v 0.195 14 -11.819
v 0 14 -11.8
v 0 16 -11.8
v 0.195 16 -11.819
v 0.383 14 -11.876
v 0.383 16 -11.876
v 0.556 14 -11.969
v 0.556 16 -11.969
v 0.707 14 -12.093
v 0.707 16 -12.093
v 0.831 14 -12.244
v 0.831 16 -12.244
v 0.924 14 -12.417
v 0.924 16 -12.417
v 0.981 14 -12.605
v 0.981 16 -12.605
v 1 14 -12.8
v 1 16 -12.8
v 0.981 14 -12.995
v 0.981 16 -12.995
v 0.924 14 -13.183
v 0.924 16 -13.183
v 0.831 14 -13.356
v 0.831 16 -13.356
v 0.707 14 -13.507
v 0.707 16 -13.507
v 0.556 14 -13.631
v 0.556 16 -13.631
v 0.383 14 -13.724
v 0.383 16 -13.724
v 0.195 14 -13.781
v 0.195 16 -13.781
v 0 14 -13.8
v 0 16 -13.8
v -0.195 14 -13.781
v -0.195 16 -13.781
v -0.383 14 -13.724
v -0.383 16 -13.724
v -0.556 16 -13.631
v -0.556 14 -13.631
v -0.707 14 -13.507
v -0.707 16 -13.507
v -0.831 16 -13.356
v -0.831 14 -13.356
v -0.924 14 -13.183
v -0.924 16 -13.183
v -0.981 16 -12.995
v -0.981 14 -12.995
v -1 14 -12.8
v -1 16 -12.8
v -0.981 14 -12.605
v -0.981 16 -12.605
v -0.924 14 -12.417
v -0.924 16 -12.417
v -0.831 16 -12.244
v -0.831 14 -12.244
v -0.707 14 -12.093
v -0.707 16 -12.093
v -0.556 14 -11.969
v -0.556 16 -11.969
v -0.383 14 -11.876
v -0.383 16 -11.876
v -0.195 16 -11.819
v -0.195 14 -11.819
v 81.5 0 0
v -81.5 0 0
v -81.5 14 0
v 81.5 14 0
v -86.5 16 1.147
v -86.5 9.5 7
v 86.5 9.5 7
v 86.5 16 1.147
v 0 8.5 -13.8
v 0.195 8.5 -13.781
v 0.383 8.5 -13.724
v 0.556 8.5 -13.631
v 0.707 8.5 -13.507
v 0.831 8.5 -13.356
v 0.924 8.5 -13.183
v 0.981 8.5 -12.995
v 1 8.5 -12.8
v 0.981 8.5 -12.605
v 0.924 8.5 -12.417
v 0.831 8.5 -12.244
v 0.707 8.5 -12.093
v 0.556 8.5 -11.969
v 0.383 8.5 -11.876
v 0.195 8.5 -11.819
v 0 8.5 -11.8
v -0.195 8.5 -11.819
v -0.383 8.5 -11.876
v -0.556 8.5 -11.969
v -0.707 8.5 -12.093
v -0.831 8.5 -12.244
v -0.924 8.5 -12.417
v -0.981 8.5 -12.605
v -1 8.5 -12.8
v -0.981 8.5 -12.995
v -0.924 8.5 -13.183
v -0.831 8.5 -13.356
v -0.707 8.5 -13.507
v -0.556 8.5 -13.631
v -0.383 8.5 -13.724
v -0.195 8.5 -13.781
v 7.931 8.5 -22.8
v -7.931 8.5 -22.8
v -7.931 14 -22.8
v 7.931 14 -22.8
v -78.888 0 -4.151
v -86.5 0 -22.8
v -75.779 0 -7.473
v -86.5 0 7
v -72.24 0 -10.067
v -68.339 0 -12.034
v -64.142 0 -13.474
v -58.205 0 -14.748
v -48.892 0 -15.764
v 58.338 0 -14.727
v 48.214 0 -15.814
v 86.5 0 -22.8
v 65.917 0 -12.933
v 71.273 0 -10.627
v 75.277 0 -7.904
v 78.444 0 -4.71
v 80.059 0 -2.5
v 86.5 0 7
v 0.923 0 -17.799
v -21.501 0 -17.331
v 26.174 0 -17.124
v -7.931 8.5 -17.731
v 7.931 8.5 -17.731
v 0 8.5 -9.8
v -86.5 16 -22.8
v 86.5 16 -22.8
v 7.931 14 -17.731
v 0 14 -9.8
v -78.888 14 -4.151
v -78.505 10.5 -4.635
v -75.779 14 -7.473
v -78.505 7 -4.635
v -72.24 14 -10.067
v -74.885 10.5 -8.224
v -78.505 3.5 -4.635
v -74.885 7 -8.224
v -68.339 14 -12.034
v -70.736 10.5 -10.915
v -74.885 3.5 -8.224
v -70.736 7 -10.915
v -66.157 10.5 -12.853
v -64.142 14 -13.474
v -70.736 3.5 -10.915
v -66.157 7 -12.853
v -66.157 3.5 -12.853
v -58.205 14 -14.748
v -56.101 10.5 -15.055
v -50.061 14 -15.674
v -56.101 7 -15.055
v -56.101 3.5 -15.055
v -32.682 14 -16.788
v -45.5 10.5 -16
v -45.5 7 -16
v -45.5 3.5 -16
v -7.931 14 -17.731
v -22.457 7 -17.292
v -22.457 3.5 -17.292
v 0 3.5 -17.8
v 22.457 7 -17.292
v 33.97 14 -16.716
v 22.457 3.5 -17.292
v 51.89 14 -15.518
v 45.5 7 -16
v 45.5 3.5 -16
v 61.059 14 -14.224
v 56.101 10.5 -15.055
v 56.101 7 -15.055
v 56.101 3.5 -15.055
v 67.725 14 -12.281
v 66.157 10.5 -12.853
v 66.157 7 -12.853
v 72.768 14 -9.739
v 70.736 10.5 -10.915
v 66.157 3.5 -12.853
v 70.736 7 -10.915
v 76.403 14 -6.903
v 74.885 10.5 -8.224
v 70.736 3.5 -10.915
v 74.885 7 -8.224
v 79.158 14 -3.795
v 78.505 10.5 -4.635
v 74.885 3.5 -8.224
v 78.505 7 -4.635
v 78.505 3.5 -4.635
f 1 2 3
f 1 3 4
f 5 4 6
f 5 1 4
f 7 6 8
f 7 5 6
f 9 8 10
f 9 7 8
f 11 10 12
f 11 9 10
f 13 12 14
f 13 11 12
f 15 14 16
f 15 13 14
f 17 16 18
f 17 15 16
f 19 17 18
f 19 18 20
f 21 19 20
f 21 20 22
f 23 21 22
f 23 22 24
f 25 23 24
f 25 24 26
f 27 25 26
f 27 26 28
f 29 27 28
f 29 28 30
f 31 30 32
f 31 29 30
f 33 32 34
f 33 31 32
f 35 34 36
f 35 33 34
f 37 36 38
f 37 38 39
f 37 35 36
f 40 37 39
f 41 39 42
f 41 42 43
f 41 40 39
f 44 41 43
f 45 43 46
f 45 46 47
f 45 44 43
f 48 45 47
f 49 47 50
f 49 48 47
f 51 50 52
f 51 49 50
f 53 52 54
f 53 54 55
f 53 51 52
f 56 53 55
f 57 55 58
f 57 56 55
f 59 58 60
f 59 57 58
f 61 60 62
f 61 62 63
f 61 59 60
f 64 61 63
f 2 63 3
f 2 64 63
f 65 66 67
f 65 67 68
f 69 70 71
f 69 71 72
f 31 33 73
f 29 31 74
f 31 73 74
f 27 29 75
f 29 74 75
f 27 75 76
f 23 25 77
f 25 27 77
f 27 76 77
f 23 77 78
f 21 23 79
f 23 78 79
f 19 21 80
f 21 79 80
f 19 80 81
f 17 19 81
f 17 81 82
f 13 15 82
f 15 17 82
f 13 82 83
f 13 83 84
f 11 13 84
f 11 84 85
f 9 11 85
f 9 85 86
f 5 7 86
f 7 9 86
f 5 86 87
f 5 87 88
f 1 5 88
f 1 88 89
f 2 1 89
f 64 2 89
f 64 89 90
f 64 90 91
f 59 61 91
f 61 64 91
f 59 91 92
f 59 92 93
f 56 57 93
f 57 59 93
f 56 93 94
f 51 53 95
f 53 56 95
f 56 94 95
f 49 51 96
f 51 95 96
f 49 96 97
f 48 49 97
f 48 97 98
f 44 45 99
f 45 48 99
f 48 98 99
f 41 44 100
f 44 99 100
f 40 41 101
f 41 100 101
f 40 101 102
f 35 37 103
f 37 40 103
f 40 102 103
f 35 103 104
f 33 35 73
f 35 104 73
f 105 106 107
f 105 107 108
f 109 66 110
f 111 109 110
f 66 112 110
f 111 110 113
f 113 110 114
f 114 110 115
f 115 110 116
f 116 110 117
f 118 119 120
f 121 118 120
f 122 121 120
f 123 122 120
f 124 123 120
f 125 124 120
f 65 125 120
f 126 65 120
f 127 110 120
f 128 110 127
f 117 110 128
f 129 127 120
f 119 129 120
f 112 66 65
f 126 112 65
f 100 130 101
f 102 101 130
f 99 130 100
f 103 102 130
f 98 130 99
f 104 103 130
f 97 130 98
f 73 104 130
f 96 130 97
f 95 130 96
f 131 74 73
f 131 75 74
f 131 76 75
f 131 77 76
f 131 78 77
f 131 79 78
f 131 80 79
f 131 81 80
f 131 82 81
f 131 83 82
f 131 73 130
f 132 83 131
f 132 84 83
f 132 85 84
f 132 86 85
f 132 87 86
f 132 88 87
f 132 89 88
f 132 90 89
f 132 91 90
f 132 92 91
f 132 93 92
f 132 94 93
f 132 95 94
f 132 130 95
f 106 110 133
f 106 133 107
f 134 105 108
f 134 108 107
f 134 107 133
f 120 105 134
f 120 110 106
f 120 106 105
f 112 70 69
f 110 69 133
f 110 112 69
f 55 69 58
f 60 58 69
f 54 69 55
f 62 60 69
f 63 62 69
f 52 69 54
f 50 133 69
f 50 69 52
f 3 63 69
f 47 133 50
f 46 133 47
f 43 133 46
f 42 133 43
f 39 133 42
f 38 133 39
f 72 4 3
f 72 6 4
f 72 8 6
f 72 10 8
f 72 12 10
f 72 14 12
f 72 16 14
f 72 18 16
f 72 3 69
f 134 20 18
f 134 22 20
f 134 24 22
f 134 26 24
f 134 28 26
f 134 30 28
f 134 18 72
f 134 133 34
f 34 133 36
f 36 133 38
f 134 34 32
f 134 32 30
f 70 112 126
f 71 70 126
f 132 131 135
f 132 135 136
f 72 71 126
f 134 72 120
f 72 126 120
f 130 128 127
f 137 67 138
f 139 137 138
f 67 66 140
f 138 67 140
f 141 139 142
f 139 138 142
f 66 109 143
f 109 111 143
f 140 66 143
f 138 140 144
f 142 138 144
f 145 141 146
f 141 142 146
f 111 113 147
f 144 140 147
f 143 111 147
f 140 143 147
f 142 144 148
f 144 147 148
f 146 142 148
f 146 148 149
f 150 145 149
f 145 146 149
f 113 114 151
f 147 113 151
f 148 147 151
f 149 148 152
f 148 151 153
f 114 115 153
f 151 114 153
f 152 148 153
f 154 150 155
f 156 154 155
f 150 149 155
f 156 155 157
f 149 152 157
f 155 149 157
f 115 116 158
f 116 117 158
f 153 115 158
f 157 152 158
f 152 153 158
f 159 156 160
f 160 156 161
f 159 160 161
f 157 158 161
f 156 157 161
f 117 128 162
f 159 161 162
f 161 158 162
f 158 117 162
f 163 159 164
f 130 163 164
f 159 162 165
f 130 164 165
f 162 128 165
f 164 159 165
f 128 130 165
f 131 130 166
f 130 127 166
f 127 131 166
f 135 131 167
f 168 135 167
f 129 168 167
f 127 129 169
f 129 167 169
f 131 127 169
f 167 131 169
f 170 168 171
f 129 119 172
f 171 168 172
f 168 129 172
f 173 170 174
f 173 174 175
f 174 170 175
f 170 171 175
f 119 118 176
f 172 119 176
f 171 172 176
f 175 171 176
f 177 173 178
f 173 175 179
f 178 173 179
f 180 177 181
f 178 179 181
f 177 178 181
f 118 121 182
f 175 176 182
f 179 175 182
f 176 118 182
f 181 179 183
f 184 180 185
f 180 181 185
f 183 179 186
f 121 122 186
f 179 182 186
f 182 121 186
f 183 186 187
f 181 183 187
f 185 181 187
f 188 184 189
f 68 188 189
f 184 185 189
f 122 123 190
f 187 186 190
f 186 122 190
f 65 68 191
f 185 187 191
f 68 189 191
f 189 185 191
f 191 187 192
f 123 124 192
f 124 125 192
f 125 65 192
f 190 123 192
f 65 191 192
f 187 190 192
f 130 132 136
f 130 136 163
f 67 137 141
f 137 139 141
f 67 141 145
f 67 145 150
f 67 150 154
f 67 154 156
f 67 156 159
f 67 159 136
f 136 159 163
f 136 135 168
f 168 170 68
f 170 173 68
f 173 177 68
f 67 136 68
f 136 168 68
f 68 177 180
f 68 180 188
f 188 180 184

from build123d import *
from build123d.topology import SkipClean

# Parameters (mm, degrees)
SKETCH2_W               = 173
SKETCH2_H               = 29.8
BOSS_EXTRUDE1_DEPTH     = 14
SKETCH4_W               = 173
SKETCH4_H               = 29.8
SKETCH4_R               = 1
BOSS_EXTRUDE3_DEPTH     = 2
BOSS_EXTRUDE4_START     = 5.5
SKETCH5_R               = 1
BOSS_EXTRUDE4_DEPTH     = 5.5
CUT_EXTRUDE1_DEPTH      = 91.874033815
CUT_EXTRUDE1_DEPTH_BACK = 91.874033815


with BuildPart() as part:
    # Sketch2 → Boss-Extrude1 (new body)
    with BuildSketch(Plane(origin=(0, 0, 0), x_dir=(1, 0, 0), z_dir=(0, 1, 0))):
        with Locations((0, 7.9)):
            Rectangle(SKETCH2_W, SKETCH2_H)
        with BuildLine():
            Line((-81.5, 0), (81.5, 0))
            add(Edge.make_bspline(
                [(-81.5, 0), (-74.436091259, 13.881927863), (-43.259356961, 16.362188276), (0, 18.555927536), (43.259356961, 16.362188276), (74.436091259, 13.881927863), (81.5, 0)],
                knots=[0, 0, 0, 0, 0.237125688, 0.5, 0.762874312, 1, 1, 1, 1], degree=3))
        make_face(mode=Mode.SUBTRACT)
    extrude(amount=BOSS_EXTRUDE1_DEPTH)

    # Sketch4 → Boss-Extrude3 (add)
    with BuildSketch(Plane(origin=(0, 14, 0), x_dir=(1, 0, 0), z_dir=(0, 1, 0))):
        with Locations((0, 7.9)):
            Rectangle(SKETCH4_W, SKETCH4_H)
        with Locations(Location((0, 12.8, 0), (0, 0, 270))):
            Circle(SKETCH4_R, mode=Mode.SUBTRACT)
    extrude(amount=BOSS_EXTRUDE3_DEPTH)

    # Sketch5 → Boss-Extrude4 (add)
    with SkipClean():  # the faces are left unmerged after this step: merging them gives an invalid solid
        with BuildSketch(Plane.XZ.offset(-14).offset(BOSS_EXTRUDE4_START)):
            Polygon((0, -9.8), (-7.931348641, -17.731348641), (-7.931348641, -22.8), (7.931348641, -22.8), (7.931348641, -17.731348641), align=None)
            with Locations(Location((0, -12.8, 0), (0, 0, 270))):
                Circle(SKETCH5_R, mode=Mode.SUBTRACT)
        extrude(amount=-BOSS_EXTRUDE4_DEPTH)

    # Sketch3 → Cut-Extrude1 (cut, two sides: drawn at the far end of the back side and taken through both)
    with SkipClean():  # the faces are left unmerged after this step: merging them gives an invalid solid
        with BuildSketch(Plane(origin=(0, 0, 0), x_dir=(0, 0, -1), z_dir=(1, 0, 0)).offset(-CUT_EXTRUDE1_DEPTH_BACK)):
            Polygon((-48.86878806, -37), (4.996225752, 22.823158451), (1.280501625, 26.168811483), (-52.584512187, -33.654346968), align=None)
        extrude(amount=CUT_EXTRUDE1_DEPTH + CUT_EXTRUDE1_DEPTH_BACK, mode=Mode.SUBTRACT)


solid = part.part
